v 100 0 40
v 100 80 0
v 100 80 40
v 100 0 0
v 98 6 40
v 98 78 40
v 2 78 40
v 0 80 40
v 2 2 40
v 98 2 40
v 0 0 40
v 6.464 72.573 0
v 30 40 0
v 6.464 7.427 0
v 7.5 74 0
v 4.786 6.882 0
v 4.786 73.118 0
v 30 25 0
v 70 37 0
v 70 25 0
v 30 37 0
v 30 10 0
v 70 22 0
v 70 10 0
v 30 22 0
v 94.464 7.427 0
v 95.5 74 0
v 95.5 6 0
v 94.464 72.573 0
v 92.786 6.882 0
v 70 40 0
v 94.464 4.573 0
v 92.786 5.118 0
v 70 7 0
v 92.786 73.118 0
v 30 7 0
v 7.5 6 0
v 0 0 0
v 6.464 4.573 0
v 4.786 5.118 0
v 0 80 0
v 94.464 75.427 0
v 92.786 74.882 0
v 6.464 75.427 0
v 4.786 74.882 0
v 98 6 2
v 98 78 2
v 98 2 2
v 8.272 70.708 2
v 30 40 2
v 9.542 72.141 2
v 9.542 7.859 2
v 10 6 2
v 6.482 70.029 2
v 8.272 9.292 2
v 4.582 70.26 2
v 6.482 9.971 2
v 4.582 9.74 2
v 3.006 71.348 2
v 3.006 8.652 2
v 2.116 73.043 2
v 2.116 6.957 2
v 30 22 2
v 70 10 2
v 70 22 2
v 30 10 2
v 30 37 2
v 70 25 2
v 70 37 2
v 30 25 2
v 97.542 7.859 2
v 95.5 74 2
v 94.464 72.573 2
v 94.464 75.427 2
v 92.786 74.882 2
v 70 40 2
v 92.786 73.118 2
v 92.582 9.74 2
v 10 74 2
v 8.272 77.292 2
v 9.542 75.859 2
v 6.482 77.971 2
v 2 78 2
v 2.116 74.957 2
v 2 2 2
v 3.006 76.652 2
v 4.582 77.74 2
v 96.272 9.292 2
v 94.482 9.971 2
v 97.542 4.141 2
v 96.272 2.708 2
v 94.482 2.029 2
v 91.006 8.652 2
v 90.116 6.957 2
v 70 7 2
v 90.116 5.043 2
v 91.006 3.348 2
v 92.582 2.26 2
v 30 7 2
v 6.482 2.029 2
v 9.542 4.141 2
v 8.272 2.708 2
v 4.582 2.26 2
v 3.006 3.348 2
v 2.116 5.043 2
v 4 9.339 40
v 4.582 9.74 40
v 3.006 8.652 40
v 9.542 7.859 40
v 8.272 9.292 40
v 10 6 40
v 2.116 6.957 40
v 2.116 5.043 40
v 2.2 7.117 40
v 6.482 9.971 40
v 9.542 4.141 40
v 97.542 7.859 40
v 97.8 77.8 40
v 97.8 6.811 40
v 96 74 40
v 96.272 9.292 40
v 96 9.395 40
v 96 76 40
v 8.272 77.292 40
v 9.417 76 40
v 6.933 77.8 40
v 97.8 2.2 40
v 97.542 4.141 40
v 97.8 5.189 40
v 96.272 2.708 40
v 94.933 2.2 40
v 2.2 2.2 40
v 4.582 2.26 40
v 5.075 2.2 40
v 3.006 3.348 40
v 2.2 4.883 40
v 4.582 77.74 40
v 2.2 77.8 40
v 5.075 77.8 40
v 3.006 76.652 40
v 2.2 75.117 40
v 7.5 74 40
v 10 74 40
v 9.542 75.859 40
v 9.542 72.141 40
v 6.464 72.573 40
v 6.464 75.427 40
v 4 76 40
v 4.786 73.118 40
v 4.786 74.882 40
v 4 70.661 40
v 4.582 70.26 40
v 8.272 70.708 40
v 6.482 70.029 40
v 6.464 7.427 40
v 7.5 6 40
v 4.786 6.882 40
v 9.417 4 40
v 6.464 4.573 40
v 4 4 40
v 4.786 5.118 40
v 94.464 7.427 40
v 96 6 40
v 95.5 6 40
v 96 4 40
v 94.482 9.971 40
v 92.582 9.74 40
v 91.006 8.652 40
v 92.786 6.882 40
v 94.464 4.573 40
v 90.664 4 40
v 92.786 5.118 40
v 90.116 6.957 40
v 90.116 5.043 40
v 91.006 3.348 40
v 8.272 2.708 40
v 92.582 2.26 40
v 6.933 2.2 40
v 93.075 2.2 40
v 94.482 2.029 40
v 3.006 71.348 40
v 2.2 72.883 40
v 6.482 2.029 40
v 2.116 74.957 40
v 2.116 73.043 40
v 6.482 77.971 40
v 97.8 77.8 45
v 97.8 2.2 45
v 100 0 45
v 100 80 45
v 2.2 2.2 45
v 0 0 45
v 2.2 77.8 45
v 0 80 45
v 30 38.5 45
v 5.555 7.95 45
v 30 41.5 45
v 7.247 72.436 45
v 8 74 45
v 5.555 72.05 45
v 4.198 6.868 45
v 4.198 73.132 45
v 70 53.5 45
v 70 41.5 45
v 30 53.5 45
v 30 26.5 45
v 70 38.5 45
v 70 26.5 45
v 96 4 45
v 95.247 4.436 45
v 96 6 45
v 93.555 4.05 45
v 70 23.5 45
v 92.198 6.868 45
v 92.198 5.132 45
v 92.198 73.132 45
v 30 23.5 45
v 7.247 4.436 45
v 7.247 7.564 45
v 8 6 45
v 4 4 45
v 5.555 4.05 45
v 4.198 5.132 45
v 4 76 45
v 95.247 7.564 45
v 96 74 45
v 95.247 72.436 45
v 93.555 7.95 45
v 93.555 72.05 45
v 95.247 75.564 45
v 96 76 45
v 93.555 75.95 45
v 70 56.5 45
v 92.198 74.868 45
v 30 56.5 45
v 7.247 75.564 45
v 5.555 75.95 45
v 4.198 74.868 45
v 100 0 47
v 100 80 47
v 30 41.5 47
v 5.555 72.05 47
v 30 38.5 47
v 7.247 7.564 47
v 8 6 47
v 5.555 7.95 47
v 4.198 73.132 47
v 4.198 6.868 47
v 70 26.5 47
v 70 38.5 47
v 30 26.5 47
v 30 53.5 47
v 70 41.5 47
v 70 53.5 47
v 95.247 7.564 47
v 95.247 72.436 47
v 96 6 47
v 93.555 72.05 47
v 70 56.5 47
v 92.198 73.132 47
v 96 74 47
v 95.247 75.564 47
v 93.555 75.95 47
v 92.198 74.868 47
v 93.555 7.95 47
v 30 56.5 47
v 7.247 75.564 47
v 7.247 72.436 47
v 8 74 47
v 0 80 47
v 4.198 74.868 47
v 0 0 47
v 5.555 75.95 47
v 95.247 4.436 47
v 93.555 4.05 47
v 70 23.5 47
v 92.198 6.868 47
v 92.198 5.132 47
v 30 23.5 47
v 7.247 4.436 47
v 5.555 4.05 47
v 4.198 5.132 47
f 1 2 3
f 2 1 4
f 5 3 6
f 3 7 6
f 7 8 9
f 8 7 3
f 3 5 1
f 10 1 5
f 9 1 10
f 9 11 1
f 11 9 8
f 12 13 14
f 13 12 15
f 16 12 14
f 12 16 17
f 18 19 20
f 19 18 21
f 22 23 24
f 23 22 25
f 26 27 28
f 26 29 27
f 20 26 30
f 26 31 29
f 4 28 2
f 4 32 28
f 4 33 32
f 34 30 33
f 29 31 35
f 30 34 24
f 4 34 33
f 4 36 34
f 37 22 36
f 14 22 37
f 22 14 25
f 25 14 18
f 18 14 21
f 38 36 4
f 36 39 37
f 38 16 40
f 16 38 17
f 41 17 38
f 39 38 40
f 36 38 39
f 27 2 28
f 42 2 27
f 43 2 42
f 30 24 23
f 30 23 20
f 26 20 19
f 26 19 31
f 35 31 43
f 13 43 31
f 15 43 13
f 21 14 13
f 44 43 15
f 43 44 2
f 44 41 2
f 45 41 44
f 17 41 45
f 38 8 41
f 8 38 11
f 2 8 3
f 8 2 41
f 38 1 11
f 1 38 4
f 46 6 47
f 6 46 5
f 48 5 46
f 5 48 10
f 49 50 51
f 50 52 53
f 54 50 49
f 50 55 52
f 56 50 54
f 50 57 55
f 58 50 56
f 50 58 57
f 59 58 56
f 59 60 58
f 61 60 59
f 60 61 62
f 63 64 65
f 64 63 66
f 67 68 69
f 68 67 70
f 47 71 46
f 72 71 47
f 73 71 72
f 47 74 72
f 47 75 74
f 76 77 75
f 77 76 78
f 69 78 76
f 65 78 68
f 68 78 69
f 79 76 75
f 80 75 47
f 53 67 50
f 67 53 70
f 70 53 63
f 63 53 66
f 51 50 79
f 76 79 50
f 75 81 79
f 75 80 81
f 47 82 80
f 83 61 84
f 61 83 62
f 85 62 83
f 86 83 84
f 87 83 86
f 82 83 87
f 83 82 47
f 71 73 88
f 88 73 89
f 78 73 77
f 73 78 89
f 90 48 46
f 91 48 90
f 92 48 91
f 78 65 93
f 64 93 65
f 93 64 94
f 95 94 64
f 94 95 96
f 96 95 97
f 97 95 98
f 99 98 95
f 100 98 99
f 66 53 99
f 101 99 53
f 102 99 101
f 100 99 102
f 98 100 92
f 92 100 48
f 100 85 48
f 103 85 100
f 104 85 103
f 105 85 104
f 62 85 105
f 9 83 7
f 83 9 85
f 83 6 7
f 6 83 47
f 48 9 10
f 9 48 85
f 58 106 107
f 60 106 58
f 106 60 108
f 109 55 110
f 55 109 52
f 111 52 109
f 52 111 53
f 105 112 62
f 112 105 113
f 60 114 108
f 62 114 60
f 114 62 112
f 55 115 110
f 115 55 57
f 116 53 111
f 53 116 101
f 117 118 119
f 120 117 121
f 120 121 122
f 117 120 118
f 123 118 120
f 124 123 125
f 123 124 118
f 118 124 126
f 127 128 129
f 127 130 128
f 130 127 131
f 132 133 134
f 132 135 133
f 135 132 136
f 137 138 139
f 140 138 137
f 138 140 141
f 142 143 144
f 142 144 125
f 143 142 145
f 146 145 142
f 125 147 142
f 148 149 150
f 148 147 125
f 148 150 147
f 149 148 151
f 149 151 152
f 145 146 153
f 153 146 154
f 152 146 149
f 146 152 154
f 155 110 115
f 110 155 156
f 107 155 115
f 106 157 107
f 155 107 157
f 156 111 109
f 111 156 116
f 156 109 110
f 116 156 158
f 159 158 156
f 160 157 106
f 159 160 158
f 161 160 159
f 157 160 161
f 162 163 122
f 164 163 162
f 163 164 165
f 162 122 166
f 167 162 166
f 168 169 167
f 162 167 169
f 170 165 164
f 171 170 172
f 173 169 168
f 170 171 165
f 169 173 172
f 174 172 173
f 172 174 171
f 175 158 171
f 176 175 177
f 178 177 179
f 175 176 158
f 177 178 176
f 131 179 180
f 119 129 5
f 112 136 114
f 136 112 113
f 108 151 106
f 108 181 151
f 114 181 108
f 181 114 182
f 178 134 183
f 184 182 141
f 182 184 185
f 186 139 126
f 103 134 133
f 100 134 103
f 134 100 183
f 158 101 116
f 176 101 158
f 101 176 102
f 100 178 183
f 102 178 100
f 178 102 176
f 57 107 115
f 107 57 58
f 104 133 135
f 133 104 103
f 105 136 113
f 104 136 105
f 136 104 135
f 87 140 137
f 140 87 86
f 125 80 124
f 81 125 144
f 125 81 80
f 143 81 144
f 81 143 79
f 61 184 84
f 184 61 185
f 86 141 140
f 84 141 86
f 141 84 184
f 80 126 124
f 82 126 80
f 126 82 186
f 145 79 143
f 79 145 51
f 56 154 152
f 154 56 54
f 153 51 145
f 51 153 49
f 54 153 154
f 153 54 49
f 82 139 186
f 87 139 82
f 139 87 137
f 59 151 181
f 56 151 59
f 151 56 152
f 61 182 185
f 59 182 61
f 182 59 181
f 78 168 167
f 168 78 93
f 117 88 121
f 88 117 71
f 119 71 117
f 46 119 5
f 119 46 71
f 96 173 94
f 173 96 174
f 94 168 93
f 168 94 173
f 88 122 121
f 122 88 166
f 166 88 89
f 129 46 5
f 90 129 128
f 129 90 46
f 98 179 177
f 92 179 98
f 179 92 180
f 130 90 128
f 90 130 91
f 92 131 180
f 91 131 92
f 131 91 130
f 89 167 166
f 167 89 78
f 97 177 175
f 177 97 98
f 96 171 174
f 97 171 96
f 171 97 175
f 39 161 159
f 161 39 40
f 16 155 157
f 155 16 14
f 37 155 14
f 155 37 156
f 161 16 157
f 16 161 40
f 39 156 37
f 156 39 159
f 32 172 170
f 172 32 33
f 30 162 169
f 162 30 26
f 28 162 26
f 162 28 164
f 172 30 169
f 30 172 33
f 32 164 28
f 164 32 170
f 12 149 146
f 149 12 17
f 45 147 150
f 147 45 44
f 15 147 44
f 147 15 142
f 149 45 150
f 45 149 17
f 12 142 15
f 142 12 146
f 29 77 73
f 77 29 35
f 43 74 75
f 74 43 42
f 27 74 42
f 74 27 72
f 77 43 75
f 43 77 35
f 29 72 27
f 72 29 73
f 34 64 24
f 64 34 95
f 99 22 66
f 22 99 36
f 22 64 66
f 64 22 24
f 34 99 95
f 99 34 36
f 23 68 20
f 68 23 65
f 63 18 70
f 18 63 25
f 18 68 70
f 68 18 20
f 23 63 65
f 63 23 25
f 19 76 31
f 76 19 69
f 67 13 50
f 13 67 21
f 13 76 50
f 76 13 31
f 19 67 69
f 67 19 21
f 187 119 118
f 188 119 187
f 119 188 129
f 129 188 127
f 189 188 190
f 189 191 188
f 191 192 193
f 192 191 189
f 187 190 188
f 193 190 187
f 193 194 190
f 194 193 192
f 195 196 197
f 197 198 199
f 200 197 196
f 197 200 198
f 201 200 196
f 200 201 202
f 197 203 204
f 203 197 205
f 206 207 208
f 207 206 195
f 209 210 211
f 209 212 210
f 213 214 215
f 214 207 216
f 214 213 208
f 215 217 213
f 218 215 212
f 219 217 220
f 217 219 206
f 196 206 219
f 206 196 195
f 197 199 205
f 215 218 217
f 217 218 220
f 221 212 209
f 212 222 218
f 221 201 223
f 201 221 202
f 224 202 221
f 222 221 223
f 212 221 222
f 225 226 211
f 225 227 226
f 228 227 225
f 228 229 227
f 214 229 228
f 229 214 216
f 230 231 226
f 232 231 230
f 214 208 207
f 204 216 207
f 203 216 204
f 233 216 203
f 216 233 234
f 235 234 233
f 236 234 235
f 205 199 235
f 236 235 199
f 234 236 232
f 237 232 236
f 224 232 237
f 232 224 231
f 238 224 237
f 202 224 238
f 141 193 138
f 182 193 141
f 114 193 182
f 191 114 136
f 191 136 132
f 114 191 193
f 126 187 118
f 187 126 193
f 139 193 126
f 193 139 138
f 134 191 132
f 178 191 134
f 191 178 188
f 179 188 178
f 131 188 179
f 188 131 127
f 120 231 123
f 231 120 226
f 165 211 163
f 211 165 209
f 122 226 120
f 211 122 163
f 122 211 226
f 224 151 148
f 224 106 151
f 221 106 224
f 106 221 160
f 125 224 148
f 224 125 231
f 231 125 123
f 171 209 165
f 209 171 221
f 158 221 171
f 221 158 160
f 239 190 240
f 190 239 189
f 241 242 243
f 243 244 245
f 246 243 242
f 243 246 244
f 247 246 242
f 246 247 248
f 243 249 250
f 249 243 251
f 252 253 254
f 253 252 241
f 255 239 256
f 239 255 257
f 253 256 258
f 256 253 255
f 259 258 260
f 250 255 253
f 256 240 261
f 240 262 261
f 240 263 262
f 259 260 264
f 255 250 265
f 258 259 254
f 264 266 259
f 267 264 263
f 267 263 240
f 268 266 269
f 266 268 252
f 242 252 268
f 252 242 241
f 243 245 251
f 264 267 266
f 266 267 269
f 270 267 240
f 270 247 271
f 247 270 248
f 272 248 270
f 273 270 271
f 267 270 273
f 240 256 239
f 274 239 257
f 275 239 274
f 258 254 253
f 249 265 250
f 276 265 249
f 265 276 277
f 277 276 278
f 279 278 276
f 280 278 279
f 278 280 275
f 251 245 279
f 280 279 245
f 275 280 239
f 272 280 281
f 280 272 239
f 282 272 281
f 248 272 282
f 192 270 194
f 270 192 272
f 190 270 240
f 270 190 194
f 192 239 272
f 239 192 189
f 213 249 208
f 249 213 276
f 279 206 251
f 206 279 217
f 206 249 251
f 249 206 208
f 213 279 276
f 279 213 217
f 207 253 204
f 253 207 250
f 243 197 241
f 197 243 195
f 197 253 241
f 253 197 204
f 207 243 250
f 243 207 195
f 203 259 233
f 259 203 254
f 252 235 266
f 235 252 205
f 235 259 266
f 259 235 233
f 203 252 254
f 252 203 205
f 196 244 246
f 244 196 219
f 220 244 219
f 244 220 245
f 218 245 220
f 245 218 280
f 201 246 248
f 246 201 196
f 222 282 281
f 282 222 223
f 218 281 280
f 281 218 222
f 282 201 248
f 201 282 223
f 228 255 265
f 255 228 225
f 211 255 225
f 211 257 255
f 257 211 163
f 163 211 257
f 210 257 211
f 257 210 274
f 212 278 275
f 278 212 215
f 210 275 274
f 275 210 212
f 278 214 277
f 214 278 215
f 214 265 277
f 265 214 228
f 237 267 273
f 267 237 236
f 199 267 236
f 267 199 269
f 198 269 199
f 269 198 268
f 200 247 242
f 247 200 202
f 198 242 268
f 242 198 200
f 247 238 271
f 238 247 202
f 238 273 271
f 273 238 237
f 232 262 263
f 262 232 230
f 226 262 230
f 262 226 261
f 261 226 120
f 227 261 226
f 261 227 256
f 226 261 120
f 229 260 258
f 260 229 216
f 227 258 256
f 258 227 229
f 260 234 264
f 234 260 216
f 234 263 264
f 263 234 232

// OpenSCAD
// Box with Lid, Corner Posts, and Ventilation
// Adjustable parameters
box_width = 100;
box_depth = 80;
box_height = 40;
wall_thickness = 2;
lid_height = 15;
clearance = 0.2; // Gap between lid and box for fit

// Screw post parameters
post_diameter = 8;
screw_hole_diameter = 3;
post_height = box_height - wall_thickness;

// Ventilation slot parameters
vent_width = 40;
vent_height = 3;
vent_spacing = 15;

// Render selection (change to view different parts)
render_part = "both"; // Options: "box", "lid", "both"

// Main rendering
if (render_part == "both") {
    bottom_box();
    translate([0, 0, box_height + 5])
        lid();
} else if (render_part == "box") {
    bottom_box();
} else if (render_part == "lid") {
    lid();
}

// Bottom box with corner posts
module bottom_box() {
    difference() {
        union() {
            // Main box shell
            difference() {
                cube([box_width, box_depth, box_height]);
                translate([wall_thickness, wall_thickness, wall_thickness])
                    cube([box_width - 2*wall_thickness, 
                          box_depth - 2*wall_thickness, 
                          box_height]);
            }
            
            // Corner mounting posts (3 corners as requested)
            for (i = [0:2]) {
                x = (i == 0 || i == 1) ? wall_thickness + post_diameter/2 : box_width - wall_thickness - post_diameter/2;
                y = (i == 0 || i == 2) ? wall_thickness + post_diameter/2 : box_depth - wall_thickness - post_diameter/2;
                translate([x, y, wall_thickness])
                    cylinder(h = post_height, d = post_diameter);
            }
        }
        
        // Screw holes in 4 corners of base
        corner_positions = [
            [wall_thickness + post_diameter/2, wall_thickness + post_diameter/2],
            [box_width - wall_thickness - post_diameter/2, wall_thickness + post_diameter/2],
            [wall_thickness + post_diameter/2, box_depth - wall_thickness - post_diameter/2],
            [box_width - wall_thickness - post_diameter/2, box_depth - wall_thickness - post_diameter/2]
        ];
        
        for (pos = corner_positions) {
            translate([pos[0], pos[1], -1])
                cylinder(h = box_height + 2, d = screw_hole_diameter);
        }
        
        // Ventilation slots on bottom (3 slots)
        for (i = [0:2]) {
            translate([box_width/2 - vent_width/2, 
                       wall_thickness + 5 + i * vent_spacing, 
                       -1])
                cube([vent_width, vent_height, wall_thickness + 2]);
        }
    }
}

// Lid with rim and ventilation
module lid() {
    rim_depth = 5;
    rim_width = wall_thickness - clearance;
    
    difference() {
        union() {
            // Lid top plate
            cube([box_width, box_depth, wall_thickness]);
            
            // Rim that fits inside box
            translate([wall_thickness + clearance, 
                       wall_thickness + clearance, 
                       -rim_depth])
                difference() {
                    cube([box_width - 2*(wall_thickness + clearance), 
                          box_depth - 2*(wall_thickness + clearance), 
                          rim_depth]);
                    translate([rim_width, rim_width, -1])
                        cube([box_width - 2*(wall_thickness + clearance) - 2*rim_width, 
                              box_depth - 2*(wall_thickness + clearance) - 2*rim_width, 
                              rim_depth + 2]);
                }
        }
        
        // Ventilation slots on top (3 slots)
        for (i = [0:2]) {
            translate([box_width/2 - vent_width/2, 
                       box_depth/2 - vent_height/2 - vent_spacing + i * vent_spacing, 
                       -1])
                cube([vent_width, vent_height, wall_thickness + 2]);
        }
        
        // Screw clearance holes in lid corners
        corner_positions = [
            [wall_thickness + post_diameter/2, wall_thickness + post_diameter/2],
            [box_width - wall_thickness - post_diameter/2, wall_thickness + post_diameter/2],
            [wall_thickness + post_diameter/2, box_depth - wall_thickness - post_diameter/2],
            [box_width - wall_thickness - post_diameter/2, box_depth - wall_thickness - post_diameter/2]
        ];
        
        for (pos = corner_positions) {
            translate([pos[0], pos[1], -rim_depth - 1])
                cylinder(h = rim_depth + wall_thickness + 2, d = screw_hole_diameter + 1);
        }
    }
}
